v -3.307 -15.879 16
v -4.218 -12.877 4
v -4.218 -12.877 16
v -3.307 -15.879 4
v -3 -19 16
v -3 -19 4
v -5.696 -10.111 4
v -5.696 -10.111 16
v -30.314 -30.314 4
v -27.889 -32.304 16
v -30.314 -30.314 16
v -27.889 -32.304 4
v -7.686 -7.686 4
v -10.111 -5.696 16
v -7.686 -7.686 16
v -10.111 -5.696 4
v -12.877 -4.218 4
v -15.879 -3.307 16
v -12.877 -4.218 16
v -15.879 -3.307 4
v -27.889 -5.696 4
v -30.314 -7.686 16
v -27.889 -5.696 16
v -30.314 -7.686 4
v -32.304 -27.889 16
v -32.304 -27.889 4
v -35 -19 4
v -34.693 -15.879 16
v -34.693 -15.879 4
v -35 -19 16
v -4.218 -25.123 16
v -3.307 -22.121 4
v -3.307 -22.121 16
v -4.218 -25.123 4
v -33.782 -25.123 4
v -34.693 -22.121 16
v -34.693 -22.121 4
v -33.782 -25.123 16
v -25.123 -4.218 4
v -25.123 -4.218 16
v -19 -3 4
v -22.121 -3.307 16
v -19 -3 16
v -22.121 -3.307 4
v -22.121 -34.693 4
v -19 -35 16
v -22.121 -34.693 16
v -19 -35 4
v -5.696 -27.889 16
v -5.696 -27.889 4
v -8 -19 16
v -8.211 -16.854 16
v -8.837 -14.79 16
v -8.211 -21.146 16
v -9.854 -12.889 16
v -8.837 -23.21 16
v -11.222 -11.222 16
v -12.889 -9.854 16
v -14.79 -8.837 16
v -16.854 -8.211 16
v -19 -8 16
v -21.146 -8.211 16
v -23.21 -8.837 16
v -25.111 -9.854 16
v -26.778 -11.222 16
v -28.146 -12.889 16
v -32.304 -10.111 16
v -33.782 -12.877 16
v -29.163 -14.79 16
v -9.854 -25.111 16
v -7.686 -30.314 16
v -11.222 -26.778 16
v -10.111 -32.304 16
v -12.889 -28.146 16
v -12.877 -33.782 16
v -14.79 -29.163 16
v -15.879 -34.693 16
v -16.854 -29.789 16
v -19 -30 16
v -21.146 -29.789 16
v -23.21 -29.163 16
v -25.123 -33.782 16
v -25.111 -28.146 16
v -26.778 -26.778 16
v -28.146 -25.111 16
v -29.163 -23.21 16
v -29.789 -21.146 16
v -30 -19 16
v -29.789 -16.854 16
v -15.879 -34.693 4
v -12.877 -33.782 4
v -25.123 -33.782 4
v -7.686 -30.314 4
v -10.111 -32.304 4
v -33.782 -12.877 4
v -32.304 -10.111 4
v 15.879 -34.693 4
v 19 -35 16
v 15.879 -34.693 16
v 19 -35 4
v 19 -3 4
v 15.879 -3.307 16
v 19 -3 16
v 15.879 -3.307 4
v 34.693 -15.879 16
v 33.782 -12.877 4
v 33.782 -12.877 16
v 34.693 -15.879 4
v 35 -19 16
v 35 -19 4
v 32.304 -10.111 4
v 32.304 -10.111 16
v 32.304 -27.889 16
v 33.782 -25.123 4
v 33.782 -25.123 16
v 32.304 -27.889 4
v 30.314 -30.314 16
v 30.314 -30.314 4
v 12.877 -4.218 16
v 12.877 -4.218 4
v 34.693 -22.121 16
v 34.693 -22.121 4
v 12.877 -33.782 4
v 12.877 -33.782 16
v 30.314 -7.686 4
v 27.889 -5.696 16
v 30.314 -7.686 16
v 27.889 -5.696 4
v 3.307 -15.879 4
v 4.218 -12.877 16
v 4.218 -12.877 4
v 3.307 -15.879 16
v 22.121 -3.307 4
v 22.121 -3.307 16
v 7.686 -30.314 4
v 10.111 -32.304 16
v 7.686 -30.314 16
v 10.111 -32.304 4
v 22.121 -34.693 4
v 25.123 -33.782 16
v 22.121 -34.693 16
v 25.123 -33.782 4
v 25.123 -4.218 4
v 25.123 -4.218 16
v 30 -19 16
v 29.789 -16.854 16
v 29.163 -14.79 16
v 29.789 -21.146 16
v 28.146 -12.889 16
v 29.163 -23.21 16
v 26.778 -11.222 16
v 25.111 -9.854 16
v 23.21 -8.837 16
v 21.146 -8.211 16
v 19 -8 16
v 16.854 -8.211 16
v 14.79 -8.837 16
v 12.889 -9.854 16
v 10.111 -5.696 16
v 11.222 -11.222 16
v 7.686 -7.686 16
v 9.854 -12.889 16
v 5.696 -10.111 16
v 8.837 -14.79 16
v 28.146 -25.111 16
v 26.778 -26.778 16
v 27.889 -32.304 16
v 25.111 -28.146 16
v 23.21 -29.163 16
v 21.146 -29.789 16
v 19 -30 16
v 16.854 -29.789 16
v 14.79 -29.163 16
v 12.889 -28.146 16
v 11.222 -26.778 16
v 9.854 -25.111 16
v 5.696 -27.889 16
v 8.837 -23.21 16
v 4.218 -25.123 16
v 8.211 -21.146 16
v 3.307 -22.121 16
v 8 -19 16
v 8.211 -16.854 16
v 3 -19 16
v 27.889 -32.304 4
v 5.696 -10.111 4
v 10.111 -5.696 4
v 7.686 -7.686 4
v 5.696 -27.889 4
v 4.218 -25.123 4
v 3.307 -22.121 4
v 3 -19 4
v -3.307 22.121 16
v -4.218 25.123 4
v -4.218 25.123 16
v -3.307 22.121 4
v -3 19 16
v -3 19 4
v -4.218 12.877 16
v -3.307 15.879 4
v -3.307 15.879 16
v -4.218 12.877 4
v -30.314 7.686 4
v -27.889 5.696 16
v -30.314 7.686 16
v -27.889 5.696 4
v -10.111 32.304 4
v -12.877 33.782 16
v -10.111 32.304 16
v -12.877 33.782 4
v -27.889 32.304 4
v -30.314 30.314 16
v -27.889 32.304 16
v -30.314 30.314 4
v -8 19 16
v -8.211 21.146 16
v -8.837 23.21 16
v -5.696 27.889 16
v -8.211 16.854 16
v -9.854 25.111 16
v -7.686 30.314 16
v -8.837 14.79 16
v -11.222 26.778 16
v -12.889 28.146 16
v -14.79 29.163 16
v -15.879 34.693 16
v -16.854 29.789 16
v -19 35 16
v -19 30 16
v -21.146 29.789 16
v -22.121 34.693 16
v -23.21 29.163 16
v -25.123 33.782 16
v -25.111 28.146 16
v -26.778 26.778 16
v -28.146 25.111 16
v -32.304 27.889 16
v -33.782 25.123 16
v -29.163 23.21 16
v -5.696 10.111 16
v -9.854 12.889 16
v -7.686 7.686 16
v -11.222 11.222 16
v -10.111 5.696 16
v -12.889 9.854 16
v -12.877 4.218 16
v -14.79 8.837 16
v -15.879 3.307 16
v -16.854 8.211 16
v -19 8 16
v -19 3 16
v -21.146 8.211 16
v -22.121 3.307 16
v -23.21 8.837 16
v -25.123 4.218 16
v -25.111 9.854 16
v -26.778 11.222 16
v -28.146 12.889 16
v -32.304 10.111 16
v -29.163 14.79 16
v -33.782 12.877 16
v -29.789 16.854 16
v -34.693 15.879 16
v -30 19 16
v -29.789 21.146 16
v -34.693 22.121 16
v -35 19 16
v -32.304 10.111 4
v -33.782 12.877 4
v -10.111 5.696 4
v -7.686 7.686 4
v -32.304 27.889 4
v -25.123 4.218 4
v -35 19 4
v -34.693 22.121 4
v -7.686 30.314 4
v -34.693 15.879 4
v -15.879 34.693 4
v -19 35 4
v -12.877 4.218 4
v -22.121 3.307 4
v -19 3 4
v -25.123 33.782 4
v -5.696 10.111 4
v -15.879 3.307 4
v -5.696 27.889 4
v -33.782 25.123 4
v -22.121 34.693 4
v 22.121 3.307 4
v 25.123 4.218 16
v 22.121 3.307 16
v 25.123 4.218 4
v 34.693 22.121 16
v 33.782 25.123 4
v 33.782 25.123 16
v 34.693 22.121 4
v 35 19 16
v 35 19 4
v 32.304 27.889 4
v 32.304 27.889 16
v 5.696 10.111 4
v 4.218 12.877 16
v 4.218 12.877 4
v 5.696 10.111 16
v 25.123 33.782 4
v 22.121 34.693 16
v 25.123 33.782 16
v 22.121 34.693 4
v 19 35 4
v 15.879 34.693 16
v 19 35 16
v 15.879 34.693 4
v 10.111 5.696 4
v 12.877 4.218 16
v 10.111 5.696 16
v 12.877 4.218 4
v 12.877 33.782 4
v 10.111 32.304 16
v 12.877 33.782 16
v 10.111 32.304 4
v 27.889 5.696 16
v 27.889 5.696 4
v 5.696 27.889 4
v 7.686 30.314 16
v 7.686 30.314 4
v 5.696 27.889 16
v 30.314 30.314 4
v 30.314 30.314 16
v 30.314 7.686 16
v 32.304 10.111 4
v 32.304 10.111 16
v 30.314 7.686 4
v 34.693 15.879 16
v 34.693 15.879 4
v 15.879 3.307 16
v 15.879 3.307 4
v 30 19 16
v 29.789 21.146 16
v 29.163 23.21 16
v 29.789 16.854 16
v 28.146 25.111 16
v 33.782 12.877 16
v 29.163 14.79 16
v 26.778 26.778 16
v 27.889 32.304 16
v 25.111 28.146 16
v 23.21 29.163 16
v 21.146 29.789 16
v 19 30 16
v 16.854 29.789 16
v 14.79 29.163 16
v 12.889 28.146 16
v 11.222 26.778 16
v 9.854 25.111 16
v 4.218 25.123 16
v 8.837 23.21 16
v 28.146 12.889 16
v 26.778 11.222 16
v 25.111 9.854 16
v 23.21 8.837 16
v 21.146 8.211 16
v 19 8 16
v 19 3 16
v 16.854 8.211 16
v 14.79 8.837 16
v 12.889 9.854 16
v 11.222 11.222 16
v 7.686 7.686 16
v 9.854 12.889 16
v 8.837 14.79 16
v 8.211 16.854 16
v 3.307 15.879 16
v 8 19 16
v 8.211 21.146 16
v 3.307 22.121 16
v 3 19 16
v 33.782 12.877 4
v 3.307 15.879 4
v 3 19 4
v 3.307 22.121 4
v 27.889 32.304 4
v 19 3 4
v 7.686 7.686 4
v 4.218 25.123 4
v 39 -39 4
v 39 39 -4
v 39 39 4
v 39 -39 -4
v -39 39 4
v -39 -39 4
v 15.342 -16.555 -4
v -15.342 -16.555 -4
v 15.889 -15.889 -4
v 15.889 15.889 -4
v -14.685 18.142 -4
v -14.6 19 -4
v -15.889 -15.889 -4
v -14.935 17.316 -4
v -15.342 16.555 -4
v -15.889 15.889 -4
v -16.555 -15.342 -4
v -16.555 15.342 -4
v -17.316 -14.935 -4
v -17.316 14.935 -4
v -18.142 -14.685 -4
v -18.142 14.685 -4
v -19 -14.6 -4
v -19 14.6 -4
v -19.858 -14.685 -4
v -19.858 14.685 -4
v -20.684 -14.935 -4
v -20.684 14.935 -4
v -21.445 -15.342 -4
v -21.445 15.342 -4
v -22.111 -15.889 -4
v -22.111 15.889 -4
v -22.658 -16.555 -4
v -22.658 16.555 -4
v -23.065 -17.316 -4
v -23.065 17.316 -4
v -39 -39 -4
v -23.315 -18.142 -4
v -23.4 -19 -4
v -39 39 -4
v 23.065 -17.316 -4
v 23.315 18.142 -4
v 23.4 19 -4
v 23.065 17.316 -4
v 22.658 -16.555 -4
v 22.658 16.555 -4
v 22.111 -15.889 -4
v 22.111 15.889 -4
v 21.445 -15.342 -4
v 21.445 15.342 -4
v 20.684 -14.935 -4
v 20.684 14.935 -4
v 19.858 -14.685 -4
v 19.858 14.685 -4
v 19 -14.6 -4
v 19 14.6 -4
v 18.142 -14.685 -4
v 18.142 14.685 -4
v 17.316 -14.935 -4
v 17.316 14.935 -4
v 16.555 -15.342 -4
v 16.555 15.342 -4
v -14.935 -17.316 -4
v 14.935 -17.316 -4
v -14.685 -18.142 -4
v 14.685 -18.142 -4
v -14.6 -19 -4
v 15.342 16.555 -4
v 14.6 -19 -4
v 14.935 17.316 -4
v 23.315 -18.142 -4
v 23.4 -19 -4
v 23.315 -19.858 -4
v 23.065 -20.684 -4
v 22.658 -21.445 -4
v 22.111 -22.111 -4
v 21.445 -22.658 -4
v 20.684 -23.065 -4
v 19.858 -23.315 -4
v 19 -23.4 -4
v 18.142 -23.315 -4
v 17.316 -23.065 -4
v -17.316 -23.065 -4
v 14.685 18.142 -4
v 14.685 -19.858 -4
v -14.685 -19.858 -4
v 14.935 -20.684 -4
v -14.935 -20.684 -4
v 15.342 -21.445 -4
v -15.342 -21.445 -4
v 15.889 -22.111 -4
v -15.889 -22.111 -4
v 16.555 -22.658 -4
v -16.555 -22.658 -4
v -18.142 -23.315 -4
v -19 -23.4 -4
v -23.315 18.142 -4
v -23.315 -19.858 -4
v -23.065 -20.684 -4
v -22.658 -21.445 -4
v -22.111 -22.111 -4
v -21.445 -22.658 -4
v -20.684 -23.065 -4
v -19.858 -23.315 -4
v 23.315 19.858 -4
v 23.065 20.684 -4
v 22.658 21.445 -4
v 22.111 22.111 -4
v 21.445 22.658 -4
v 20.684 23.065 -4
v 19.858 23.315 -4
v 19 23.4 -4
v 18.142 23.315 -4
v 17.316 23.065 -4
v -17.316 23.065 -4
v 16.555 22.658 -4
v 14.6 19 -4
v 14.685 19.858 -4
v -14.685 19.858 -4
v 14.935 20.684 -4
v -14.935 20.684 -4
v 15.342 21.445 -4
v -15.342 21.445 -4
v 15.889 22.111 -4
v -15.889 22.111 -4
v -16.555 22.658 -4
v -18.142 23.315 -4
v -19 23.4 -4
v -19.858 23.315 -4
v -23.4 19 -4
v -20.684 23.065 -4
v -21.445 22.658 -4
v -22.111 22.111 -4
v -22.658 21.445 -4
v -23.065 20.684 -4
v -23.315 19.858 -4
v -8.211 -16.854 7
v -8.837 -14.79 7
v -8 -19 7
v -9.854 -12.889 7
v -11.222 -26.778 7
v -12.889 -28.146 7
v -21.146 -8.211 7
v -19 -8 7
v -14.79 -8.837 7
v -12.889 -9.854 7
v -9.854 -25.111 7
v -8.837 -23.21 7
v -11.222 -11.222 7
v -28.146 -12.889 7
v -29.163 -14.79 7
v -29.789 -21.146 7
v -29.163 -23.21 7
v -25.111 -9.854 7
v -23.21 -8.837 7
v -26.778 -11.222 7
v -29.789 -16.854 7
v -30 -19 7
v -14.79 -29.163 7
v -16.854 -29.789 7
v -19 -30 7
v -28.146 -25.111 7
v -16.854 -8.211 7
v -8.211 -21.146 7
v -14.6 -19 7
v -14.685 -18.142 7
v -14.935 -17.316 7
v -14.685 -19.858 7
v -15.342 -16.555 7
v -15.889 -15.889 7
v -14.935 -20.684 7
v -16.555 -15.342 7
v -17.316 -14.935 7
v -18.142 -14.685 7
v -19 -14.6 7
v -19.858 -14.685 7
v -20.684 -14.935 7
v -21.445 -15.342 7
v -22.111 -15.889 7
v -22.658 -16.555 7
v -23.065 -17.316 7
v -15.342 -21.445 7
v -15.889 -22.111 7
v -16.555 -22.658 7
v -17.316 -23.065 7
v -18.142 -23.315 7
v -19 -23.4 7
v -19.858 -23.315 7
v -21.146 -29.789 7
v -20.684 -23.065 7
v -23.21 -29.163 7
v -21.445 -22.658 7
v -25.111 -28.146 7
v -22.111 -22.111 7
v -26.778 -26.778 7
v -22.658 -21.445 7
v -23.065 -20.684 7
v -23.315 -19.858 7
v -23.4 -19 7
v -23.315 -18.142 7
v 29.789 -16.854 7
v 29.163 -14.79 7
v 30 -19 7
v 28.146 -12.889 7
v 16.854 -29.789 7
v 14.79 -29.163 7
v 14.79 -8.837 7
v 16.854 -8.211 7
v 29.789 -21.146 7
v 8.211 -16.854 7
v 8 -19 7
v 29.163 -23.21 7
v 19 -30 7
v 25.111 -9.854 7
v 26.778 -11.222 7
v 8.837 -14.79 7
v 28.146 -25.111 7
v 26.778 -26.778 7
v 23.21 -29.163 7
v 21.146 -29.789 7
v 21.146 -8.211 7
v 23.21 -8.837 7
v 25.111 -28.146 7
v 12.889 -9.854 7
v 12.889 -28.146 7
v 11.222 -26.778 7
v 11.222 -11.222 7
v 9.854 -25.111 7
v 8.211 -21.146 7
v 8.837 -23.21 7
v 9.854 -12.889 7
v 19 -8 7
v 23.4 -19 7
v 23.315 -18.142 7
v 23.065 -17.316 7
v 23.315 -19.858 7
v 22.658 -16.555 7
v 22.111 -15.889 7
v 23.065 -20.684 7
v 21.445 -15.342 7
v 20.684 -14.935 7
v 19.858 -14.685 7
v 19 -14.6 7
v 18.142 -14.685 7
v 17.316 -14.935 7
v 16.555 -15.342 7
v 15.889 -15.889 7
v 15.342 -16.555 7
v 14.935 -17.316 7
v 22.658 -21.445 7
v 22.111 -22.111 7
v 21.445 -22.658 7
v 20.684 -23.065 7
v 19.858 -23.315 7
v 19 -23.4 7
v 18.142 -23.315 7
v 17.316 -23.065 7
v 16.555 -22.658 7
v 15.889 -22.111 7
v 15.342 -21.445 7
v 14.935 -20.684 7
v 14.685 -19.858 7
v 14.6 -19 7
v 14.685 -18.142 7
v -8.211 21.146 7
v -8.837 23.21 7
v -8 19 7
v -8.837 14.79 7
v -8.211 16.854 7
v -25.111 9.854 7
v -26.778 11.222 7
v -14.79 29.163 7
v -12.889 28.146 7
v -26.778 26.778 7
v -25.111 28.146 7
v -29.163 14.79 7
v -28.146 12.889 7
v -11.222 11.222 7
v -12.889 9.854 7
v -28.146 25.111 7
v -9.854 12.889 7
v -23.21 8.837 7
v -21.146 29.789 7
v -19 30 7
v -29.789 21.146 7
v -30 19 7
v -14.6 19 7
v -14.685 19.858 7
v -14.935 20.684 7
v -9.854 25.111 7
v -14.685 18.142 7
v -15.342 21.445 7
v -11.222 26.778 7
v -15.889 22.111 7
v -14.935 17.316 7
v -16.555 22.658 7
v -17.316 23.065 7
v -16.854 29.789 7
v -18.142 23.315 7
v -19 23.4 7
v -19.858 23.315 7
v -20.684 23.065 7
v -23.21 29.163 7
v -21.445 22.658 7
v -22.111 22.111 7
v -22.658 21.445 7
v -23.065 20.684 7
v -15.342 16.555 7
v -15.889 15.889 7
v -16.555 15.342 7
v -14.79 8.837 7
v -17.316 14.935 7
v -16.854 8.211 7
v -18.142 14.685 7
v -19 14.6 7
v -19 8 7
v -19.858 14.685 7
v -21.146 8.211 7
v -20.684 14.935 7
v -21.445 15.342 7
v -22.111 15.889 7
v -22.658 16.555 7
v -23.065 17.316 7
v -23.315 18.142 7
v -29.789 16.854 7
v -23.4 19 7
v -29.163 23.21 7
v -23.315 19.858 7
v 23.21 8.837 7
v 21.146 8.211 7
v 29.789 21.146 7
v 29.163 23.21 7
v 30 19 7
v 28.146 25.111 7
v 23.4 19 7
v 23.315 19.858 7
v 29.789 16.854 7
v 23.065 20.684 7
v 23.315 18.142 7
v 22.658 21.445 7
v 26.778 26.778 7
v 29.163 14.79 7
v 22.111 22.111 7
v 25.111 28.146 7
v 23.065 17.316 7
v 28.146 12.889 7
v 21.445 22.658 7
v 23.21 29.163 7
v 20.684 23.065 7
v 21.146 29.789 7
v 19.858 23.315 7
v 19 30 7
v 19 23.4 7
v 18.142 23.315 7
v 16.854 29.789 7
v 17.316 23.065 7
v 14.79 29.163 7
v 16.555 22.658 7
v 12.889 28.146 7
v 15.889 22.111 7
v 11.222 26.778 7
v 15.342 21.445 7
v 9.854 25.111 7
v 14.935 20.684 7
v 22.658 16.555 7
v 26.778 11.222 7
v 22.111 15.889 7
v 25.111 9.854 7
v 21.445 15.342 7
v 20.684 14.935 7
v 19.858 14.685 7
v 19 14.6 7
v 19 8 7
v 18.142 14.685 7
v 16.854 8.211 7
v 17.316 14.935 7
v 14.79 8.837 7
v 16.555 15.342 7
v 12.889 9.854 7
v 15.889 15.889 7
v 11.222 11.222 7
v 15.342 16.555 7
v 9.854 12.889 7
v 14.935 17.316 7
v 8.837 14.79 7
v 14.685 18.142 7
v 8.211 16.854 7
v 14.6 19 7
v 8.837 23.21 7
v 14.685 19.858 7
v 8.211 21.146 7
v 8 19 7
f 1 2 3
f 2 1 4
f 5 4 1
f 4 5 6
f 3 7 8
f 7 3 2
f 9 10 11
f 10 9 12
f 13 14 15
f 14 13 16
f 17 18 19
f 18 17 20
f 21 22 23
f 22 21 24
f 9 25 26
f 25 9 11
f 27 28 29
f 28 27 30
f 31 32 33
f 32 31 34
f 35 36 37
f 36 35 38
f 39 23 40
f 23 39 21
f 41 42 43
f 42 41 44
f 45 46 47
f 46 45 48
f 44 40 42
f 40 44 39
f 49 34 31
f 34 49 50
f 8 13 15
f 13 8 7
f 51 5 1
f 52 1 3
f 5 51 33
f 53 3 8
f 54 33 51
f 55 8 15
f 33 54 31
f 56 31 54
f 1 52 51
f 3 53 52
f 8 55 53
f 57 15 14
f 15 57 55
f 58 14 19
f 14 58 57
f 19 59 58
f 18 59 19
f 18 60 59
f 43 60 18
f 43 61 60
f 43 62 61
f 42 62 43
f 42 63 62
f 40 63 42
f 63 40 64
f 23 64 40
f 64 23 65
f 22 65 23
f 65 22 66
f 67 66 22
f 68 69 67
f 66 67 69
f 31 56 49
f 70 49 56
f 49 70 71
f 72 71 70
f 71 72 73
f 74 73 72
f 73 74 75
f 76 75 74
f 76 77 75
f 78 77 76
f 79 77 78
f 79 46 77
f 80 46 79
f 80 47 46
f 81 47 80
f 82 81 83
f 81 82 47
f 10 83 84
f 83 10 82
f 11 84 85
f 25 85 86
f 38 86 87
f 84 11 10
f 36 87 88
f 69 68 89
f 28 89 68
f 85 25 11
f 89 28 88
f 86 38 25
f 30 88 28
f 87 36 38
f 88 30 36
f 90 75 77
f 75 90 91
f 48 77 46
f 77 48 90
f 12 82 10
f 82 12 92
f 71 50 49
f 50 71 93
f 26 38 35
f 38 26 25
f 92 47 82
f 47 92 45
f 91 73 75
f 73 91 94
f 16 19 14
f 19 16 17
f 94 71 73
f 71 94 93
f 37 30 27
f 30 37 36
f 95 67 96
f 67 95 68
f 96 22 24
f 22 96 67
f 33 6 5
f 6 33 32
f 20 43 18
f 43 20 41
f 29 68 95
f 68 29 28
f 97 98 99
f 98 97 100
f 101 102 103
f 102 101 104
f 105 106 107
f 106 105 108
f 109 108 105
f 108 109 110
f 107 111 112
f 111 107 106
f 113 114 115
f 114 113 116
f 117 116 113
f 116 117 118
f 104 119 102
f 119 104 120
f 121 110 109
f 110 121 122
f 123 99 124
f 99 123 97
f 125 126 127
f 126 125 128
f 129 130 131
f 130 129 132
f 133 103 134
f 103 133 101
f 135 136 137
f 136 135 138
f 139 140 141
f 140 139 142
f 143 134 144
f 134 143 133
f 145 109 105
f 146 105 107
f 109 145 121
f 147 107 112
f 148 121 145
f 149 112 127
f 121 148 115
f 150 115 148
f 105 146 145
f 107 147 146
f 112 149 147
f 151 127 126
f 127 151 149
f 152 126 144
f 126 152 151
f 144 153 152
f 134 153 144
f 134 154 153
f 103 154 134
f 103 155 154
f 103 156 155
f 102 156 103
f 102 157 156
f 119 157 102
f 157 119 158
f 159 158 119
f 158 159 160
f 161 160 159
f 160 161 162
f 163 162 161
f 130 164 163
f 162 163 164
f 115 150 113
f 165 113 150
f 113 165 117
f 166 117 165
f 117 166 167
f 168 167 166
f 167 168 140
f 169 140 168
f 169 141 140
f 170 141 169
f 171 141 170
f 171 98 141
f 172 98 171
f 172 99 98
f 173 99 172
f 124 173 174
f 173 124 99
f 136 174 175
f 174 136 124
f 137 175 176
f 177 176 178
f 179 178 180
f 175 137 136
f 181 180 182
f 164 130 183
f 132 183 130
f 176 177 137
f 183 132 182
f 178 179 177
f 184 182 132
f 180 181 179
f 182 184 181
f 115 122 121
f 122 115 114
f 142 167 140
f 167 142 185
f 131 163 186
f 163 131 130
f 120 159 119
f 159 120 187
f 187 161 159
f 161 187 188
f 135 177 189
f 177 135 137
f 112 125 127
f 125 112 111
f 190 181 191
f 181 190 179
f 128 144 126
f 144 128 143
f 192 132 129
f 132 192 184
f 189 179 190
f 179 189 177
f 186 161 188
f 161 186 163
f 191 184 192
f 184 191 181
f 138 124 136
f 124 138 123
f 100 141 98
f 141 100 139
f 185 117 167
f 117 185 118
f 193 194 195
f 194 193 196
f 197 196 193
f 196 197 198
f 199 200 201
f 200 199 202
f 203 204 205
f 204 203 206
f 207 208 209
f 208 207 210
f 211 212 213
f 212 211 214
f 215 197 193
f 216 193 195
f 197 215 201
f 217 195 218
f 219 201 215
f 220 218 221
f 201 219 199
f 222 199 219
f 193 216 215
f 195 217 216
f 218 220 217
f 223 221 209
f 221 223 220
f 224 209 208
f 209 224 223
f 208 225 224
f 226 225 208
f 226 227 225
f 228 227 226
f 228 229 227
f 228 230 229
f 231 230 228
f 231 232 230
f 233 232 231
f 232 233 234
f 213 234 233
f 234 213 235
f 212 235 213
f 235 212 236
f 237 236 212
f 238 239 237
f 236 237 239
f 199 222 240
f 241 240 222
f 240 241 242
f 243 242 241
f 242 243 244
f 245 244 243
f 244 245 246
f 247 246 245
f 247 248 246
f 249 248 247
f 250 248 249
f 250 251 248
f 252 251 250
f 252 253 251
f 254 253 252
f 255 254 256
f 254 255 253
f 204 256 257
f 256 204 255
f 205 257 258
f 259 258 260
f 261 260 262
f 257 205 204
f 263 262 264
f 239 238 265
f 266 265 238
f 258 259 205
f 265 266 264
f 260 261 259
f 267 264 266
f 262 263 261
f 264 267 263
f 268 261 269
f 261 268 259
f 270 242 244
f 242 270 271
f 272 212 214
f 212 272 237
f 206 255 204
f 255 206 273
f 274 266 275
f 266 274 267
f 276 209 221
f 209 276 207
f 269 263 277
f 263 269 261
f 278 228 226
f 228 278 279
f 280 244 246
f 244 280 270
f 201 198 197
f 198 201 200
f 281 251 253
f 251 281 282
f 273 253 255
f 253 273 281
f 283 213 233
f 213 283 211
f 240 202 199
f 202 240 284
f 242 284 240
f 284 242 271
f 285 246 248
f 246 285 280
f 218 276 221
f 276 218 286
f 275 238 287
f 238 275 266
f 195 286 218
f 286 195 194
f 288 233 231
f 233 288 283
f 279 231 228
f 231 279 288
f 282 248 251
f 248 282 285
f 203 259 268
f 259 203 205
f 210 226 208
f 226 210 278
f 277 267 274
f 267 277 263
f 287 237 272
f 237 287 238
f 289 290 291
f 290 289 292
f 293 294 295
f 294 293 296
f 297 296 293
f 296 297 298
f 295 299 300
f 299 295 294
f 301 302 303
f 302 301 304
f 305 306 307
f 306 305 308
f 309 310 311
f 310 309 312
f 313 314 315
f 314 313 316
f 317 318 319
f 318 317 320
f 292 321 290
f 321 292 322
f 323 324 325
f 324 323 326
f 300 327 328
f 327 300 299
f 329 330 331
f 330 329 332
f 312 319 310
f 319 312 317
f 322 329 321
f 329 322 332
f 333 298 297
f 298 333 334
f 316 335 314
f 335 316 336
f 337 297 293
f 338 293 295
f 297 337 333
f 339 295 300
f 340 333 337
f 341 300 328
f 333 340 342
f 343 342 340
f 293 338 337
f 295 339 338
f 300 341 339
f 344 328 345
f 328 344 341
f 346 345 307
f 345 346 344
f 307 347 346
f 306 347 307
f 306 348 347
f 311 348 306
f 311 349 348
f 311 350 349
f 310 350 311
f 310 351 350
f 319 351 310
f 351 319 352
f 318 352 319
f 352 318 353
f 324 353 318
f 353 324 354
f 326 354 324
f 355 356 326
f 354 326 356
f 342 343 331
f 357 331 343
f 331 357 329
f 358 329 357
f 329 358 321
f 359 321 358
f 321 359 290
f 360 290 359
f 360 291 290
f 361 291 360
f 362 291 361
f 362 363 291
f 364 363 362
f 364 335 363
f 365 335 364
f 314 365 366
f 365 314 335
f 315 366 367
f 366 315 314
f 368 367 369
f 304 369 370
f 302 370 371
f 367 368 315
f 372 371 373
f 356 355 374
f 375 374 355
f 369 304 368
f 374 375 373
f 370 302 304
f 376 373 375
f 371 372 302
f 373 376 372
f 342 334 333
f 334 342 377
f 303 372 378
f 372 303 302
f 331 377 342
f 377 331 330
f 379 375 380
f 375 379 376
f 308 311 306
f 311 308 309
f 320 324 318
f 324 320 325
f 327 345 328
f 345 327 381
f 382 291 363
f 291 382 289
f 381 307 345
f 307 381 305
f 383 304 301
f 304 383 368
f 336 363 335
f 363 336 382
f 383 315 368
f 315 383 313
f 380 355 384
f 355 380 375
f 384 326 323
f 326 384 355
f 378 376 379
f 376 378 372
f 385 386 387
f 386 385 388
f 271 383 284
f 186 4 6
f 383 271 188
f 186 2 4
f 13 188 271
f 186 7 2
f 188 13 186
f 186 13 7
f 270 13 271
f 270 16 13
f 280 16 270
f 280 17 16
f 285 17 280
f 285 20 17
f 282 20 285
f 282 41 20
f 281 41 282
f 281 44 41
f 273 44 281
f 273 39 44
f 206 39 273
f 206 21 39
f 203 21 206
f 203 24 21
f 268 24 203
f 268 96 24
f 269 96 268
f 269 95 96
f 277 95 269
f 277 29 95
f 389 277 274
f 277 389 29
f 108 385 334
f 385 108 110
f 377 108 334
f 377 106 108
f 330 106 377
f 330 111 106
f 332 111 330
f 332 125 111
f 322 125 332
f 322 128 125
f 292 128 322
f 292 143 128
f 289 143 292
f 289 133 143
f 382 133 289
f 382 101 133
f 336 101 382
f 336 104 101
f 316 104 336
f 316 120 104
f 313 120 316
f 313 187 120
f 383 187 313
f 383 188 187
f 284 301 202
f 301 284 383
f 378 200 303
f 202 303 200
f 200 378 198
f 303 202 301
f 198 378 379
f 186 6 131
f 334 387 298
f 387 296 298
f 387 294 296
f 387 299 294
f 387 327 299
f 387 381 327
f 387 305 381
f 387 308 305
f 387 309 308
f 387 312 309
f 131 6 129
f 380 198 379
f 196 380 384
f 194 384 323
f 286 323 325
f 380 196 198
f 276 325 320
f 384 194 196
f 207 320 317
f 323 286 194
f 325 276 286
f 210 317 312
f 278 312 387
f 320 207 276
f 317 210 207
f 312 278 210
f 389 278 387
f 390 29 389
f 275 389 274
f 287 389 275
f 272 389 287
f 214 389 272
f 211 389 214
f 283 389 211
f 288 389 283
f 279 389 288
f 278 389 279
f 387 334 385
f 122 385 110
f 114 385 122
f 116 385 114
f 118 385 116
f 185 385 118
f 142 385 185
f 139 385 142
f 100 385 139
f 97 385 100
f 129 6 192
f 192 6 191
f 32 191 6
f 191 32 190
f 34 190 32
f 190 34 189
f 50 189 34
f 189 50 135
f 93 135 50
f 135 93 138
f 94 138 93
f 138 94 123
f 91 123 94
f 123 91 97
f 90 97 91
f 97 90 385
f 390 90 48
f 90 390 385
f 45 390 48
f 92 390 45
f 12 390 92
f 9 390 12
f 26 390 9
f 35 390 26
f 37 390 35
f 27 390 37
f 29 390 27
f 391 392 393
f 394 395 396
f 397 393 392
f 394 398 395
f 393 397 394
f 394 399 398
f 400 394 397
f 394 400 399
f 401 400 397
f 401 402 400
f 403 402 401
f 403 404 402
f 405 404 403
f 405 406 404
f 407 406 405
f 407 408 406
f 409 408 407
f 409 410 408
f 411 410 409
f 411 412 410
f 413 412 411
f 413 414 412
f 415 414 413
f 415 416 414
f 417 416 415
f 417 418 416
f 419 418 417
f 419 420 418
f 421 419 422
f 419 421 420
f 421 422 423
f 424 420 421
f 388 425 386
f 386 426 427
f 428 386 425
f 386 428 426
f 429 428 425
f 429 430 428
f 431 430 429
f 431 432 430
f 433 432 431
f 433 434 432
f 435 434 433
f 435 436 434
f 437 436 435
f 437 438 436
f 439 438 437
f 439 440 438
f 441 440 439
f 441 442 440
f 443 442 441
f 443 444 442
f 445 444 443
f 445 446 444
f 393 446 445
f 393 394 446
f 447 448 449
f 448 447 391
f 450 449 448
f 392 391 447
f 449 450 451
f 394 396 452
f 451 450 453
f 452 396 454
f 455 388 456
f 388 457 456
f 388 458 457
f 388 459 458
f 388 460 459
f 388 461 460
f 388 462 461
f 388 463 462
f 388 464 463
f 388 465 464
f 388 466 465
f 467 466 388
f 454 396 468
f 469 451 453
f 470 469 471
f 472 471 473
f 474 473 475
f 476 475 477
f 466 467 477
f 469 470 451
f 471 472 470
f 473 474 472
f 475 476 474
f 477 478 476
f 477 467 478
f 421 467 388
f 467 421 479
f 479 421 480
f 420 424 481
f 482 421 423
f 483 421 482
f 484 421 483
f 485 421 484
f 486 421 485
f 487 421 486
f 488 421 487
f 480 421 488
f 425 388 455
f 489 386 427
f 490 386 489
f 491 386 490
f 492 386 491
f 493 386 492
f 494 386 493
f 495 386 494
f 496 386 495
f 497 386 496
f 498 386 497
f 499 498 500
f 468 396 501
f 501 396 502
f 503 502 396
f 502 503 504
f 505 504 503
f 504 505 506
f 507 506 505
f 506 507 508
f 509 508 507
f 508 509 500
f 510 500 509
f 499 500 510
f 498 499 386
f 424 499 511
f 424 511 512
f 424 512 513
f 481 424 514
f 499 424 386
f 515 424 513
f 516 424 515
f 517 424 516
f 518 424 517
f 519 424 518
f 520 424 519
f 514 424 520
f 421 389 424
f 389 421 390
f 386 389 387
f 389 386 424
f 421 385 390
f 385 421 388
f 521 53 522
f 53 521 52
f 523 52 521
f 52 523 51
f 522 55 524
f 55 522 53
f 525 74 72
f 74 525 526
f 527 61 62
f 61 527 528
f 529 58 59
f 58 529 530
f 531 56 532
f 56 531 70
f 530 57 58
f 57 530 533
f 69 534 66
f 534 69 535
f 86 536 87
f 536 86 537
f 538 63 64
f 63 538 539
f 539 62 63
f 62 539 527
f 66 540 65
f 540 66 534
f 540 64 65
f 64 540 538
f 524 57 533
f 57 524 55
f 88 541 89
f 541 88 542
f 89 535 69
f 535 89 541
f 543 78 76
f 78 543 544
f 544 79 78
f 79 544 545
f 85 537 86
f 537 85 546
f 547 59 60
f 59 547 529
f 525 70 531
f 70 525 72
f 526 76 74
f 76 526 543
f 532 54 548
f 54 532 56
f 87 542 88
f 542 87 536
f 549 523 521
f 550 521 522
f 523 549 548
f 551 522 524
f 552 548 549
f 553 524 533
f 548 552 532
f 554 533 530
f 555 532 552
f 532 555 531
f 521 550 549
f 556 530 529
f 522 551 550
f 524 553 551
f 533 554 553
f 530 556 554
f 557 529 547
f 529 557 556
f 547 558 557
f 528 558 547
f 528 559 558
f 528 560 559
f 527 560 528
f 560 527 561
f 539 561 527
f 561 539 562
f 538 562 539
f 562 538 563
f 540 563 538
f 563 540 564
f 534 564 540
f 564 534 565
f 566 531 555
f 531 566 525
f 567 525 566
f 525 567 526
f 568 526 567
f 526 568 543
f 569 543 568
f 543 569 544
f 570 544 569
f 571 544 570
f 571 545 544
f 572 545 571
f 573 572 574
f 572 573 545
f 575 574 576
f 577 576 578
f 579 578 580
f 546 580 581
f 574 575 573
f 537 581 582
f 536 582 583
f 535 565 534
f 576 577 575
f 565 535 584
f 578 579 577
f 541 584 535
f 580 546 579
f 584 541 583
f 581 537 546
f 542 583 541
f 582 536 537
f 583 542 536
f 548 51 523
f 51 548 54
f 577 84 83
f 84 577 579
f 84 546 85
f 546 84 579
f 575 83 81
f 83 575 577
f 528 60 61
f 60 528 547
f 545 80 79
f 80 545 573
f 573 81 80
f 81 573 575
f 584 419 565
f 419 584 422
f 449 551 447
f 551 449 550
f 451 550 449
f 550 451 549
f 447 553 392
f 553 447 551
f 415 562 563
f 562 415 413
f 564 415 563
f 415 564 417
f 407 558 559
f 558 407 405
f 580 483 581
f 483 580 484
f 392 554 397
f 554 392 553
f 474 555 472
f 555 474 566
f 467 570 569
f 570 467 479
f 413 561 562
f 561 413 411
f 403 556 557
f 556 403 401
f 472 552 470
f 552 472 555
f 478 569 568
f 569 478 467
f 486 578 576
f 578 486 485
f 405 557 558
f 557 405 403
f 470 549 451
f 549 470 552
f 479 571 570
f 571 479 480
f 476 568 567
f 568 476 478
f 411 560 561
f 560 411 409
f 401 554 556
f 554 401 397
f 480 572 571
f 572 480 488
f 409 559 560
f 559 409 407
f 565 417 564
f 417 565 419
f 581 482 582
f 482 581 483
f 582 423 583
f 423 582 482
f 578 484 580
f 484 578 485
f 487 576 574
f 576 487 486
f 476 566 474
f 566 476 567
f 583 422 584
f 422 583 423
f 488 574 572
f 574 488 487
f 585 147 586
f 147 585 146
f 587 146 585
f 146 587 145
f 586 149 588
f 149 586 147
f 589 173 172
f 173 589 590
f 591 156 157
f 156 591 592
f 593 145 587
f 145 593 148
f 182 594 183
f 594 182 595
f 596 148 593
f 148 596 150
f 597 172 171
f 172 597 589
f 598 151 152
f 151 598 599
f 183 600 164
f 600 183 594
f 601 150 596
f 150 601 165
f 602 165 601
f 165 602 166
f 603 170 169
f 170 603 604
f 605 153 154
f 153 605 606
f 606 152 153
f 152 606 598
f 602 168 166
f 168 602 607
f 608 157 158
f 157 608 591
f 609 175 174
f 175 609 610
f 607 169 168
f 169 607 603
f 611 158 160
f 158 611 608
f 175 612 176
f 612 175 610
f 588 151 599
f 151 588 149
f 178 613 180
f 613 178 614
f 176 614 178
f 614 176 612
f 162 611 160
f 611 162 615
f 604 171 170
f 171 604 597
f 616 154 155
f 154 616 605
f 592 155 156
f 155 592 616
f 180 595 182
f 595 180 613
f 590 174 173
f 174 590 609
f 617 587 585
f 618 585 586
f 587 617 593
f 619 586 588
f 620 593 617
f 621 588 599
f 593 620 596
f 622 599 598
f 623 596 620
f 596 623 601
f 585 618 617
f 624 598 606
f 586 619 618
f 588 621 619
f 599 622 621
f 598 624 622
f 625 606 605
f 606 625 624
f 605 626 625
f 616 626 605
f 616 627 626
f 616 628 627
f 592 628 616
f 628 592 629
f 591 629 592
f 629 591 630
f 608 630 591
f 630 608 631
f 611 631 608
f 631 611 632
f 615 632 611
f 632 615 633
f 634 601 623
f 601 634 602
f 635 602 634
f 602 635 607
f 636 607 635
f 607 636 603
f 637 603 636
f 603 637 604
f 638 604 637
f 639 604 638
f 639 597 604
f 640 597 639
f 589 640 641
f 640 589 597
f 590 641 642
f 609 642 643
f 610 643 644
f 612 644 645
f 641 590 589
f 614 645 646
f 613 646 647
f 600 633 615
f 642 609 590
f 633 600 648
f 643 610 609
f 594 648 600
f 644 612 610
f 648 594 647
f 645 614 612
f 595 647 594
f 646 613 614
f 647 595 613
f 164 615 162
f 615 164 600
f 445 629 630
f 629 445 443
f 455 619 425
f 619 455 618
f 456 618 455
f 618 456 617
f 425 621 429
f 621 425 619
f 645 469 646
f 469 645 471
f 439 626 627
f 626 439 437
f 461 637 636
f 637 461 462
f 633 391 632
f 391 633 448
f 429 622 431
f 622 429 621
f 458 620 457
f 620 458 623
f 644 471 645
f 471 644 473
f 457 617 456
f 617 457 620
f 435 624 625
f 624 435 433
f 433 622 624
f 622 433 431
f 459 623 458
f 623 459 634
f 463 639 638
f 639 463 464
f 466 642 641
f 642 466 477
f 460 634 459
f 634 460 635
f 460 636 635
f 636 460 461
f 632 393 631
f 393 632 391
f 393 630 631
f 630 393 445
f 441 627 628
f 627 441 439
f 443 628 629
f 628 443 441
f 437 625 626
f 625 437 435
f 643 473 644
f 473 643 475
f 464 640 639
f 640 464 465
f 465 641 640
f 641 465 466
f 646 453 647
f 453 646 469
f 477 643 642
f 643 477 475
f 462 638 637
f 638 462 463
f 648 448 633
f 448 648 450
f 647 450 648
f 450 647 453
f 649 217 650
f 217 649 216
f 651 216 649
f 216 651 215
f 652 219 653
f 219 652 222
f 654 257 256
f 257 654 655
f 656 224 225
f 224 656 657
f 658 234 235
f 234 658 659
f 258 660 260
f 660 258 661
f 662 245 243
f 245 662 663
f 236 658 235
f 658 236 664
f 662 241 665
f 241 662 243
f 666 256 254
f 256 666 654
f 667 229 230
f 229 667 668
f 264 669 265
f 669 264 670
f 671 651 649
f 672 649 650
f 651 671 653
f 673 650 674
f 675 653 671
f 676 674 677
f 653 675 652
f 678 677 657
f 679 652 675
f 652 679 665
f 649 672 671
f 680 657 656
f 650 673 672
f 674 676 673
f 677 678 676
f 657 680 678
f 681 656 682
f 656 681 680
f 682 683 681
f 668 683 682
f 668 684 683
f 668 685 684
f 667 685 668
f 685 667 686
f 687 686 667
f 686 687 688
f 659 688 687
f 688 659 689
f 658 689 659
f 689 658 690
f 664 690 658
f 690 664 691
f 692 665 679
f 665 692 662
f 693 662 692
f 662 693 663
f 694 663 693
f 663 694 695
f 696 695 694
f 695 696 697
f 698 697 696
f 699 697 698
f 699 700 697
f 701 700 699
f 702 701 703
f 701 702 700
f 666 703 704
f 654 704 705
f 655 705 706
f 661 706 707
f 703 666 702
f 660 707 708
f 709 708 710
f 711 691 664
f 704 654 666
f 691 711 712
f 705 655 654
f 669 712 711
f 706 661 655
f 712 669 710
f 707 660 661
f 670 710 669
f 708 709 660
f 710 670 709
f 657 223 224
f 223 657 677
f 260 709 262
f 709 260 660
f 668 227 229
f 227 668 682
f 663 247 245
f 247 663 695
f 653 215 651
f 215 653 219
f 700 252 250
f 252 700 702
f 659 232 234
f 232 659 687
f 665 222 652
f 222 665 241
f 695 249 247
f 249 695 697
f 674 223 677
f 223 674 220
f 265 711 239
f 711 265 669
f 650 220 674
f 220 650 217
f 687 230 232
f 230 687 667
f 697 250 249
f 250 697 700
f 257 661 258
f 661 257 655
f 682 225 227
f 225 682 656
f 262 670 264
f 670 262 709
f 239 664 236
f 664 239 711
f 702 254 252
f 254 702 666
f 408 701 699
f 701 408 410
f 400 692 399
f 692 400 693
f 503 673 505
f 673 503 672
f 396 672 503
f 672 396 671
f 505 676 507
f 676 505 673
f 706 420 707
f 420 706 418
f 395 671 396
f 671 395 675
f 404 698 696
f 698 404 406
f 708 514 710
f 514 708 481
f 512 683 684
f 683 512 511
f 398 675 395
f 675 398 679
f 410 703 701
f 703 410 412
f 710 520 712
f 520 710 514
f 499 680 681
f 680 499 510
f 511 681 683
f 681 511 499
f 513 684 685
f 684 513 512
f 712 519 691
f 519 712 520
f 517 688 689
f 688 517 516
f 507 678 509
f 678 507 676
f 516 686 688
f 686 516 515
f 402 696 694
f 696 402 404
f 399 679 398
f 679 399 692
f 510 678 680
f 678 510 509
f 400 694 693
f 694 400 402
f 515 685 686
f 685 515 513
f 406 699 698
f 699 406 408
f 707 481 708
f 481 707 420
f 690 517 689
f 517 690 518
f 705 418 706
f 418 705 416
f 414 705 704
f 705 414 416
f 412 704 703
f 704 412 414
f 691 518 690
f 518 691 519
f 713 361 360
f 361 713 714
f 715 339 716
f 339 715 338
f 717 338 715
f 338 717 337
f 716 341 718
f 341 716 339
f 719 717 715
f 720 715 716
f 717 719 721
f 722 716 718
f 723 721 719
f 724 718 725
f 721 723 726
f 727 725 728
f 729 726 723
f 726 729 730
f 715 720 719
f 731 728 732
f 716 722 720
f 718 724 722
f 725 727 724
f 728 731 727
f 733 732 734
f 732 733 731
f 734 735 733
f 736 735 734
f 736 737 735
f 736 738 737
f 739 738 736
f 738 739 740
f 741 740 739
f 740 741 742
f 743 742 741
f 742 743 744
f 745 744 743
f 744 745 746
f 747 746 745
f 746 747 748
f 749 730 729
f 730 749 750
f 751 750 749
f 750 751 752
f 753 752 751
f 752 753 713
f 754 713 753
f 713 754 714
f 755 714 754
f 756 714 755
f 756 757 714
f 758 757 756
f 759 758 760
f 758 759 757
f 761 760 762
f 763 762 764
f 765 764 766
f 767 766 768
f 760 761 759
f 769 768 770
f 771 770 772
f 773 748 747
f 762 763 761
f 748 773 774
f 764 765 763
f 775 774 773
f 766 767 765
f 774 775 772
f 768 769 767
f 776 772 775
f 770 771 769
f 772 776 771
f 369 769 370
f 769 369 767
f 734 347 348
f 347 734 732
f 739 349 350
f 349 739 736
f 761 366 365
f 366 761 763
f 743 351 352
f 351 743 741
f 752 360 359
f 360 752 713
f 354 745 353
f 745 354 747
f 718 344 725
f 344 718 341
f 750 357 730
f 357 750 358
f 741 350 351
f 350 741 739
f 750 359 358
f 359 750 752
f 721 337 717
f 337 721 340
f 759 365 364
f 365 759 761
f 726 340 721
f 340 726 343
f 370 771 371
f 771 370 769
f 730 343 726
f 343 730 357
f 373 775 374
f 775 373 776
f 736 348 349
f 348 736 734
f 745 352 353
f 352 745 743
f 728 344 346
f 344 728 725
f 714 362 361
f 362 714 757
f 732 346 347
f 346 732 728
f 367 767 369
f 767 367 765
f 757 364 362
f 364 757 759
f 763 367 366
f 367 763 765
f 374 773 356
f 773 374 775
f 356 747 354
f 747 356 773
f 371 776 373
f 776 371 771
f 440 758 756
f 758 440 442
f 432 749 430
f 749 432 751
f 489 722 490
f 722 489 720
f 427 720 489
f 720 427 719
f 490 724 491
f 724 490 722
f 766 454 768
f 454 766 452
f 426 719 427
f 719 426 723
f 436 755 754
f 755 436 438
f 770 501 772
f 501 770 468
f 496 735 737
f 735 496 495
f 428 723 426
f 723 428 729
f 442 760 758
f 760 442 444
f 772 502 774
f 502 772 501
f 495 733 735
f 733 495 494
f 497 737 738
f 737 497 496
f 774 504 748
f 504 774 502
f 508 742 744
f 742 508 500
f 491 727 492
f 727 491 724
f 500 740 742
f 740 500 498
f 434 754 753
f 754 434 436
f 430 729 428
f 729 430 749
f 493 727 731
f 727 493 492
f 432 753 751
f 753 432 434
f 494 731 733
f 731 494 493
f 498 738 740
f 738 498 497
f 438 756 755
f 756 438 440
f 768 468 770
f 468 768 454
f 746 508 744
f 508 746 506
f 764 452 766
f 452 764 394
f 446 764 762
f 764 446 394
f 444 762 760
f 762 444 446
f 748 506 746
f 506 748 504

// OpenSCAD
$fn = 32;

// ----------------------------------------------------------------------
// Socket pad plate
// bosses with counterbored sockets for the screws
// ----------------------------------------------------------------------

// --- parameters (mm) ---
base_t = 8;        // base plate thickness
boss_h = 12;       // boss height above the base plate
boss_d = 32;       // boss diameter
socket_d = 22;     // socket diameter
socket_depth = 9;  // socket depth from the boss face
bolt_d = 8.8;      // screw clearance hole through the socket floor
rows = 2;          // boss rows
cols = 2;          // bosses per row
pitch = 38;        // boss pitch

// --- derived feature positions (mm) ---
height = base_t + boss_h;           // = 20   overall height of the part
plate = [pitch * (cols - 1) + boss_d + 8, pitch * (rows - 1) + boss_d + 8, base_t];  // = [78, 78, 8]   overall size (x, y, z)
span_x = pitch * (cols - 1);        // = 38   distance between outer bosses
span_y = pitch * (rows - 1);        // = 38   distance between boss rows
origin_x = -span_x / 2;             // = -19   X of the first boss
origin_y = -span_y / 2;             // = -19   Y of the first boss
feature_centers = [
  [origin_x + 0 * pitch, origin_y + 0 * pitch],
  [origin_x + 1 * pitch, origin_y + 0 * pitch],
  [origin_x + 0 * pitch, origin_y + 1 * pitch],
  [origin_x + 1 * pitch, origin_y + 1 * pitch]
];   // boss centres: sockets, holes and the pads themselves are placed from here

// base plate, bosses on feature_centers, socket + through hole in each
difference() {
  union() {
    cube(plate, center = true);
    for (centre = feature_centers)
      translate([centre[0], centre[1], plate[2] / 2 - 1])
        cylinder(d = boss_d, h = boss_h + 1);
  }
  for (centre = feature_centers) {
    translate([centre[0], centre[1], plate[2] / 2 + boss_h - socket_depth])
      cylinder(d = socket_d, h = socket_depth + 1);
    translate([centre[0], centre[1], -height])
      cylinder(d = bolt_d, h = 2 * height + 2);  // through the socket floor
  }
}
